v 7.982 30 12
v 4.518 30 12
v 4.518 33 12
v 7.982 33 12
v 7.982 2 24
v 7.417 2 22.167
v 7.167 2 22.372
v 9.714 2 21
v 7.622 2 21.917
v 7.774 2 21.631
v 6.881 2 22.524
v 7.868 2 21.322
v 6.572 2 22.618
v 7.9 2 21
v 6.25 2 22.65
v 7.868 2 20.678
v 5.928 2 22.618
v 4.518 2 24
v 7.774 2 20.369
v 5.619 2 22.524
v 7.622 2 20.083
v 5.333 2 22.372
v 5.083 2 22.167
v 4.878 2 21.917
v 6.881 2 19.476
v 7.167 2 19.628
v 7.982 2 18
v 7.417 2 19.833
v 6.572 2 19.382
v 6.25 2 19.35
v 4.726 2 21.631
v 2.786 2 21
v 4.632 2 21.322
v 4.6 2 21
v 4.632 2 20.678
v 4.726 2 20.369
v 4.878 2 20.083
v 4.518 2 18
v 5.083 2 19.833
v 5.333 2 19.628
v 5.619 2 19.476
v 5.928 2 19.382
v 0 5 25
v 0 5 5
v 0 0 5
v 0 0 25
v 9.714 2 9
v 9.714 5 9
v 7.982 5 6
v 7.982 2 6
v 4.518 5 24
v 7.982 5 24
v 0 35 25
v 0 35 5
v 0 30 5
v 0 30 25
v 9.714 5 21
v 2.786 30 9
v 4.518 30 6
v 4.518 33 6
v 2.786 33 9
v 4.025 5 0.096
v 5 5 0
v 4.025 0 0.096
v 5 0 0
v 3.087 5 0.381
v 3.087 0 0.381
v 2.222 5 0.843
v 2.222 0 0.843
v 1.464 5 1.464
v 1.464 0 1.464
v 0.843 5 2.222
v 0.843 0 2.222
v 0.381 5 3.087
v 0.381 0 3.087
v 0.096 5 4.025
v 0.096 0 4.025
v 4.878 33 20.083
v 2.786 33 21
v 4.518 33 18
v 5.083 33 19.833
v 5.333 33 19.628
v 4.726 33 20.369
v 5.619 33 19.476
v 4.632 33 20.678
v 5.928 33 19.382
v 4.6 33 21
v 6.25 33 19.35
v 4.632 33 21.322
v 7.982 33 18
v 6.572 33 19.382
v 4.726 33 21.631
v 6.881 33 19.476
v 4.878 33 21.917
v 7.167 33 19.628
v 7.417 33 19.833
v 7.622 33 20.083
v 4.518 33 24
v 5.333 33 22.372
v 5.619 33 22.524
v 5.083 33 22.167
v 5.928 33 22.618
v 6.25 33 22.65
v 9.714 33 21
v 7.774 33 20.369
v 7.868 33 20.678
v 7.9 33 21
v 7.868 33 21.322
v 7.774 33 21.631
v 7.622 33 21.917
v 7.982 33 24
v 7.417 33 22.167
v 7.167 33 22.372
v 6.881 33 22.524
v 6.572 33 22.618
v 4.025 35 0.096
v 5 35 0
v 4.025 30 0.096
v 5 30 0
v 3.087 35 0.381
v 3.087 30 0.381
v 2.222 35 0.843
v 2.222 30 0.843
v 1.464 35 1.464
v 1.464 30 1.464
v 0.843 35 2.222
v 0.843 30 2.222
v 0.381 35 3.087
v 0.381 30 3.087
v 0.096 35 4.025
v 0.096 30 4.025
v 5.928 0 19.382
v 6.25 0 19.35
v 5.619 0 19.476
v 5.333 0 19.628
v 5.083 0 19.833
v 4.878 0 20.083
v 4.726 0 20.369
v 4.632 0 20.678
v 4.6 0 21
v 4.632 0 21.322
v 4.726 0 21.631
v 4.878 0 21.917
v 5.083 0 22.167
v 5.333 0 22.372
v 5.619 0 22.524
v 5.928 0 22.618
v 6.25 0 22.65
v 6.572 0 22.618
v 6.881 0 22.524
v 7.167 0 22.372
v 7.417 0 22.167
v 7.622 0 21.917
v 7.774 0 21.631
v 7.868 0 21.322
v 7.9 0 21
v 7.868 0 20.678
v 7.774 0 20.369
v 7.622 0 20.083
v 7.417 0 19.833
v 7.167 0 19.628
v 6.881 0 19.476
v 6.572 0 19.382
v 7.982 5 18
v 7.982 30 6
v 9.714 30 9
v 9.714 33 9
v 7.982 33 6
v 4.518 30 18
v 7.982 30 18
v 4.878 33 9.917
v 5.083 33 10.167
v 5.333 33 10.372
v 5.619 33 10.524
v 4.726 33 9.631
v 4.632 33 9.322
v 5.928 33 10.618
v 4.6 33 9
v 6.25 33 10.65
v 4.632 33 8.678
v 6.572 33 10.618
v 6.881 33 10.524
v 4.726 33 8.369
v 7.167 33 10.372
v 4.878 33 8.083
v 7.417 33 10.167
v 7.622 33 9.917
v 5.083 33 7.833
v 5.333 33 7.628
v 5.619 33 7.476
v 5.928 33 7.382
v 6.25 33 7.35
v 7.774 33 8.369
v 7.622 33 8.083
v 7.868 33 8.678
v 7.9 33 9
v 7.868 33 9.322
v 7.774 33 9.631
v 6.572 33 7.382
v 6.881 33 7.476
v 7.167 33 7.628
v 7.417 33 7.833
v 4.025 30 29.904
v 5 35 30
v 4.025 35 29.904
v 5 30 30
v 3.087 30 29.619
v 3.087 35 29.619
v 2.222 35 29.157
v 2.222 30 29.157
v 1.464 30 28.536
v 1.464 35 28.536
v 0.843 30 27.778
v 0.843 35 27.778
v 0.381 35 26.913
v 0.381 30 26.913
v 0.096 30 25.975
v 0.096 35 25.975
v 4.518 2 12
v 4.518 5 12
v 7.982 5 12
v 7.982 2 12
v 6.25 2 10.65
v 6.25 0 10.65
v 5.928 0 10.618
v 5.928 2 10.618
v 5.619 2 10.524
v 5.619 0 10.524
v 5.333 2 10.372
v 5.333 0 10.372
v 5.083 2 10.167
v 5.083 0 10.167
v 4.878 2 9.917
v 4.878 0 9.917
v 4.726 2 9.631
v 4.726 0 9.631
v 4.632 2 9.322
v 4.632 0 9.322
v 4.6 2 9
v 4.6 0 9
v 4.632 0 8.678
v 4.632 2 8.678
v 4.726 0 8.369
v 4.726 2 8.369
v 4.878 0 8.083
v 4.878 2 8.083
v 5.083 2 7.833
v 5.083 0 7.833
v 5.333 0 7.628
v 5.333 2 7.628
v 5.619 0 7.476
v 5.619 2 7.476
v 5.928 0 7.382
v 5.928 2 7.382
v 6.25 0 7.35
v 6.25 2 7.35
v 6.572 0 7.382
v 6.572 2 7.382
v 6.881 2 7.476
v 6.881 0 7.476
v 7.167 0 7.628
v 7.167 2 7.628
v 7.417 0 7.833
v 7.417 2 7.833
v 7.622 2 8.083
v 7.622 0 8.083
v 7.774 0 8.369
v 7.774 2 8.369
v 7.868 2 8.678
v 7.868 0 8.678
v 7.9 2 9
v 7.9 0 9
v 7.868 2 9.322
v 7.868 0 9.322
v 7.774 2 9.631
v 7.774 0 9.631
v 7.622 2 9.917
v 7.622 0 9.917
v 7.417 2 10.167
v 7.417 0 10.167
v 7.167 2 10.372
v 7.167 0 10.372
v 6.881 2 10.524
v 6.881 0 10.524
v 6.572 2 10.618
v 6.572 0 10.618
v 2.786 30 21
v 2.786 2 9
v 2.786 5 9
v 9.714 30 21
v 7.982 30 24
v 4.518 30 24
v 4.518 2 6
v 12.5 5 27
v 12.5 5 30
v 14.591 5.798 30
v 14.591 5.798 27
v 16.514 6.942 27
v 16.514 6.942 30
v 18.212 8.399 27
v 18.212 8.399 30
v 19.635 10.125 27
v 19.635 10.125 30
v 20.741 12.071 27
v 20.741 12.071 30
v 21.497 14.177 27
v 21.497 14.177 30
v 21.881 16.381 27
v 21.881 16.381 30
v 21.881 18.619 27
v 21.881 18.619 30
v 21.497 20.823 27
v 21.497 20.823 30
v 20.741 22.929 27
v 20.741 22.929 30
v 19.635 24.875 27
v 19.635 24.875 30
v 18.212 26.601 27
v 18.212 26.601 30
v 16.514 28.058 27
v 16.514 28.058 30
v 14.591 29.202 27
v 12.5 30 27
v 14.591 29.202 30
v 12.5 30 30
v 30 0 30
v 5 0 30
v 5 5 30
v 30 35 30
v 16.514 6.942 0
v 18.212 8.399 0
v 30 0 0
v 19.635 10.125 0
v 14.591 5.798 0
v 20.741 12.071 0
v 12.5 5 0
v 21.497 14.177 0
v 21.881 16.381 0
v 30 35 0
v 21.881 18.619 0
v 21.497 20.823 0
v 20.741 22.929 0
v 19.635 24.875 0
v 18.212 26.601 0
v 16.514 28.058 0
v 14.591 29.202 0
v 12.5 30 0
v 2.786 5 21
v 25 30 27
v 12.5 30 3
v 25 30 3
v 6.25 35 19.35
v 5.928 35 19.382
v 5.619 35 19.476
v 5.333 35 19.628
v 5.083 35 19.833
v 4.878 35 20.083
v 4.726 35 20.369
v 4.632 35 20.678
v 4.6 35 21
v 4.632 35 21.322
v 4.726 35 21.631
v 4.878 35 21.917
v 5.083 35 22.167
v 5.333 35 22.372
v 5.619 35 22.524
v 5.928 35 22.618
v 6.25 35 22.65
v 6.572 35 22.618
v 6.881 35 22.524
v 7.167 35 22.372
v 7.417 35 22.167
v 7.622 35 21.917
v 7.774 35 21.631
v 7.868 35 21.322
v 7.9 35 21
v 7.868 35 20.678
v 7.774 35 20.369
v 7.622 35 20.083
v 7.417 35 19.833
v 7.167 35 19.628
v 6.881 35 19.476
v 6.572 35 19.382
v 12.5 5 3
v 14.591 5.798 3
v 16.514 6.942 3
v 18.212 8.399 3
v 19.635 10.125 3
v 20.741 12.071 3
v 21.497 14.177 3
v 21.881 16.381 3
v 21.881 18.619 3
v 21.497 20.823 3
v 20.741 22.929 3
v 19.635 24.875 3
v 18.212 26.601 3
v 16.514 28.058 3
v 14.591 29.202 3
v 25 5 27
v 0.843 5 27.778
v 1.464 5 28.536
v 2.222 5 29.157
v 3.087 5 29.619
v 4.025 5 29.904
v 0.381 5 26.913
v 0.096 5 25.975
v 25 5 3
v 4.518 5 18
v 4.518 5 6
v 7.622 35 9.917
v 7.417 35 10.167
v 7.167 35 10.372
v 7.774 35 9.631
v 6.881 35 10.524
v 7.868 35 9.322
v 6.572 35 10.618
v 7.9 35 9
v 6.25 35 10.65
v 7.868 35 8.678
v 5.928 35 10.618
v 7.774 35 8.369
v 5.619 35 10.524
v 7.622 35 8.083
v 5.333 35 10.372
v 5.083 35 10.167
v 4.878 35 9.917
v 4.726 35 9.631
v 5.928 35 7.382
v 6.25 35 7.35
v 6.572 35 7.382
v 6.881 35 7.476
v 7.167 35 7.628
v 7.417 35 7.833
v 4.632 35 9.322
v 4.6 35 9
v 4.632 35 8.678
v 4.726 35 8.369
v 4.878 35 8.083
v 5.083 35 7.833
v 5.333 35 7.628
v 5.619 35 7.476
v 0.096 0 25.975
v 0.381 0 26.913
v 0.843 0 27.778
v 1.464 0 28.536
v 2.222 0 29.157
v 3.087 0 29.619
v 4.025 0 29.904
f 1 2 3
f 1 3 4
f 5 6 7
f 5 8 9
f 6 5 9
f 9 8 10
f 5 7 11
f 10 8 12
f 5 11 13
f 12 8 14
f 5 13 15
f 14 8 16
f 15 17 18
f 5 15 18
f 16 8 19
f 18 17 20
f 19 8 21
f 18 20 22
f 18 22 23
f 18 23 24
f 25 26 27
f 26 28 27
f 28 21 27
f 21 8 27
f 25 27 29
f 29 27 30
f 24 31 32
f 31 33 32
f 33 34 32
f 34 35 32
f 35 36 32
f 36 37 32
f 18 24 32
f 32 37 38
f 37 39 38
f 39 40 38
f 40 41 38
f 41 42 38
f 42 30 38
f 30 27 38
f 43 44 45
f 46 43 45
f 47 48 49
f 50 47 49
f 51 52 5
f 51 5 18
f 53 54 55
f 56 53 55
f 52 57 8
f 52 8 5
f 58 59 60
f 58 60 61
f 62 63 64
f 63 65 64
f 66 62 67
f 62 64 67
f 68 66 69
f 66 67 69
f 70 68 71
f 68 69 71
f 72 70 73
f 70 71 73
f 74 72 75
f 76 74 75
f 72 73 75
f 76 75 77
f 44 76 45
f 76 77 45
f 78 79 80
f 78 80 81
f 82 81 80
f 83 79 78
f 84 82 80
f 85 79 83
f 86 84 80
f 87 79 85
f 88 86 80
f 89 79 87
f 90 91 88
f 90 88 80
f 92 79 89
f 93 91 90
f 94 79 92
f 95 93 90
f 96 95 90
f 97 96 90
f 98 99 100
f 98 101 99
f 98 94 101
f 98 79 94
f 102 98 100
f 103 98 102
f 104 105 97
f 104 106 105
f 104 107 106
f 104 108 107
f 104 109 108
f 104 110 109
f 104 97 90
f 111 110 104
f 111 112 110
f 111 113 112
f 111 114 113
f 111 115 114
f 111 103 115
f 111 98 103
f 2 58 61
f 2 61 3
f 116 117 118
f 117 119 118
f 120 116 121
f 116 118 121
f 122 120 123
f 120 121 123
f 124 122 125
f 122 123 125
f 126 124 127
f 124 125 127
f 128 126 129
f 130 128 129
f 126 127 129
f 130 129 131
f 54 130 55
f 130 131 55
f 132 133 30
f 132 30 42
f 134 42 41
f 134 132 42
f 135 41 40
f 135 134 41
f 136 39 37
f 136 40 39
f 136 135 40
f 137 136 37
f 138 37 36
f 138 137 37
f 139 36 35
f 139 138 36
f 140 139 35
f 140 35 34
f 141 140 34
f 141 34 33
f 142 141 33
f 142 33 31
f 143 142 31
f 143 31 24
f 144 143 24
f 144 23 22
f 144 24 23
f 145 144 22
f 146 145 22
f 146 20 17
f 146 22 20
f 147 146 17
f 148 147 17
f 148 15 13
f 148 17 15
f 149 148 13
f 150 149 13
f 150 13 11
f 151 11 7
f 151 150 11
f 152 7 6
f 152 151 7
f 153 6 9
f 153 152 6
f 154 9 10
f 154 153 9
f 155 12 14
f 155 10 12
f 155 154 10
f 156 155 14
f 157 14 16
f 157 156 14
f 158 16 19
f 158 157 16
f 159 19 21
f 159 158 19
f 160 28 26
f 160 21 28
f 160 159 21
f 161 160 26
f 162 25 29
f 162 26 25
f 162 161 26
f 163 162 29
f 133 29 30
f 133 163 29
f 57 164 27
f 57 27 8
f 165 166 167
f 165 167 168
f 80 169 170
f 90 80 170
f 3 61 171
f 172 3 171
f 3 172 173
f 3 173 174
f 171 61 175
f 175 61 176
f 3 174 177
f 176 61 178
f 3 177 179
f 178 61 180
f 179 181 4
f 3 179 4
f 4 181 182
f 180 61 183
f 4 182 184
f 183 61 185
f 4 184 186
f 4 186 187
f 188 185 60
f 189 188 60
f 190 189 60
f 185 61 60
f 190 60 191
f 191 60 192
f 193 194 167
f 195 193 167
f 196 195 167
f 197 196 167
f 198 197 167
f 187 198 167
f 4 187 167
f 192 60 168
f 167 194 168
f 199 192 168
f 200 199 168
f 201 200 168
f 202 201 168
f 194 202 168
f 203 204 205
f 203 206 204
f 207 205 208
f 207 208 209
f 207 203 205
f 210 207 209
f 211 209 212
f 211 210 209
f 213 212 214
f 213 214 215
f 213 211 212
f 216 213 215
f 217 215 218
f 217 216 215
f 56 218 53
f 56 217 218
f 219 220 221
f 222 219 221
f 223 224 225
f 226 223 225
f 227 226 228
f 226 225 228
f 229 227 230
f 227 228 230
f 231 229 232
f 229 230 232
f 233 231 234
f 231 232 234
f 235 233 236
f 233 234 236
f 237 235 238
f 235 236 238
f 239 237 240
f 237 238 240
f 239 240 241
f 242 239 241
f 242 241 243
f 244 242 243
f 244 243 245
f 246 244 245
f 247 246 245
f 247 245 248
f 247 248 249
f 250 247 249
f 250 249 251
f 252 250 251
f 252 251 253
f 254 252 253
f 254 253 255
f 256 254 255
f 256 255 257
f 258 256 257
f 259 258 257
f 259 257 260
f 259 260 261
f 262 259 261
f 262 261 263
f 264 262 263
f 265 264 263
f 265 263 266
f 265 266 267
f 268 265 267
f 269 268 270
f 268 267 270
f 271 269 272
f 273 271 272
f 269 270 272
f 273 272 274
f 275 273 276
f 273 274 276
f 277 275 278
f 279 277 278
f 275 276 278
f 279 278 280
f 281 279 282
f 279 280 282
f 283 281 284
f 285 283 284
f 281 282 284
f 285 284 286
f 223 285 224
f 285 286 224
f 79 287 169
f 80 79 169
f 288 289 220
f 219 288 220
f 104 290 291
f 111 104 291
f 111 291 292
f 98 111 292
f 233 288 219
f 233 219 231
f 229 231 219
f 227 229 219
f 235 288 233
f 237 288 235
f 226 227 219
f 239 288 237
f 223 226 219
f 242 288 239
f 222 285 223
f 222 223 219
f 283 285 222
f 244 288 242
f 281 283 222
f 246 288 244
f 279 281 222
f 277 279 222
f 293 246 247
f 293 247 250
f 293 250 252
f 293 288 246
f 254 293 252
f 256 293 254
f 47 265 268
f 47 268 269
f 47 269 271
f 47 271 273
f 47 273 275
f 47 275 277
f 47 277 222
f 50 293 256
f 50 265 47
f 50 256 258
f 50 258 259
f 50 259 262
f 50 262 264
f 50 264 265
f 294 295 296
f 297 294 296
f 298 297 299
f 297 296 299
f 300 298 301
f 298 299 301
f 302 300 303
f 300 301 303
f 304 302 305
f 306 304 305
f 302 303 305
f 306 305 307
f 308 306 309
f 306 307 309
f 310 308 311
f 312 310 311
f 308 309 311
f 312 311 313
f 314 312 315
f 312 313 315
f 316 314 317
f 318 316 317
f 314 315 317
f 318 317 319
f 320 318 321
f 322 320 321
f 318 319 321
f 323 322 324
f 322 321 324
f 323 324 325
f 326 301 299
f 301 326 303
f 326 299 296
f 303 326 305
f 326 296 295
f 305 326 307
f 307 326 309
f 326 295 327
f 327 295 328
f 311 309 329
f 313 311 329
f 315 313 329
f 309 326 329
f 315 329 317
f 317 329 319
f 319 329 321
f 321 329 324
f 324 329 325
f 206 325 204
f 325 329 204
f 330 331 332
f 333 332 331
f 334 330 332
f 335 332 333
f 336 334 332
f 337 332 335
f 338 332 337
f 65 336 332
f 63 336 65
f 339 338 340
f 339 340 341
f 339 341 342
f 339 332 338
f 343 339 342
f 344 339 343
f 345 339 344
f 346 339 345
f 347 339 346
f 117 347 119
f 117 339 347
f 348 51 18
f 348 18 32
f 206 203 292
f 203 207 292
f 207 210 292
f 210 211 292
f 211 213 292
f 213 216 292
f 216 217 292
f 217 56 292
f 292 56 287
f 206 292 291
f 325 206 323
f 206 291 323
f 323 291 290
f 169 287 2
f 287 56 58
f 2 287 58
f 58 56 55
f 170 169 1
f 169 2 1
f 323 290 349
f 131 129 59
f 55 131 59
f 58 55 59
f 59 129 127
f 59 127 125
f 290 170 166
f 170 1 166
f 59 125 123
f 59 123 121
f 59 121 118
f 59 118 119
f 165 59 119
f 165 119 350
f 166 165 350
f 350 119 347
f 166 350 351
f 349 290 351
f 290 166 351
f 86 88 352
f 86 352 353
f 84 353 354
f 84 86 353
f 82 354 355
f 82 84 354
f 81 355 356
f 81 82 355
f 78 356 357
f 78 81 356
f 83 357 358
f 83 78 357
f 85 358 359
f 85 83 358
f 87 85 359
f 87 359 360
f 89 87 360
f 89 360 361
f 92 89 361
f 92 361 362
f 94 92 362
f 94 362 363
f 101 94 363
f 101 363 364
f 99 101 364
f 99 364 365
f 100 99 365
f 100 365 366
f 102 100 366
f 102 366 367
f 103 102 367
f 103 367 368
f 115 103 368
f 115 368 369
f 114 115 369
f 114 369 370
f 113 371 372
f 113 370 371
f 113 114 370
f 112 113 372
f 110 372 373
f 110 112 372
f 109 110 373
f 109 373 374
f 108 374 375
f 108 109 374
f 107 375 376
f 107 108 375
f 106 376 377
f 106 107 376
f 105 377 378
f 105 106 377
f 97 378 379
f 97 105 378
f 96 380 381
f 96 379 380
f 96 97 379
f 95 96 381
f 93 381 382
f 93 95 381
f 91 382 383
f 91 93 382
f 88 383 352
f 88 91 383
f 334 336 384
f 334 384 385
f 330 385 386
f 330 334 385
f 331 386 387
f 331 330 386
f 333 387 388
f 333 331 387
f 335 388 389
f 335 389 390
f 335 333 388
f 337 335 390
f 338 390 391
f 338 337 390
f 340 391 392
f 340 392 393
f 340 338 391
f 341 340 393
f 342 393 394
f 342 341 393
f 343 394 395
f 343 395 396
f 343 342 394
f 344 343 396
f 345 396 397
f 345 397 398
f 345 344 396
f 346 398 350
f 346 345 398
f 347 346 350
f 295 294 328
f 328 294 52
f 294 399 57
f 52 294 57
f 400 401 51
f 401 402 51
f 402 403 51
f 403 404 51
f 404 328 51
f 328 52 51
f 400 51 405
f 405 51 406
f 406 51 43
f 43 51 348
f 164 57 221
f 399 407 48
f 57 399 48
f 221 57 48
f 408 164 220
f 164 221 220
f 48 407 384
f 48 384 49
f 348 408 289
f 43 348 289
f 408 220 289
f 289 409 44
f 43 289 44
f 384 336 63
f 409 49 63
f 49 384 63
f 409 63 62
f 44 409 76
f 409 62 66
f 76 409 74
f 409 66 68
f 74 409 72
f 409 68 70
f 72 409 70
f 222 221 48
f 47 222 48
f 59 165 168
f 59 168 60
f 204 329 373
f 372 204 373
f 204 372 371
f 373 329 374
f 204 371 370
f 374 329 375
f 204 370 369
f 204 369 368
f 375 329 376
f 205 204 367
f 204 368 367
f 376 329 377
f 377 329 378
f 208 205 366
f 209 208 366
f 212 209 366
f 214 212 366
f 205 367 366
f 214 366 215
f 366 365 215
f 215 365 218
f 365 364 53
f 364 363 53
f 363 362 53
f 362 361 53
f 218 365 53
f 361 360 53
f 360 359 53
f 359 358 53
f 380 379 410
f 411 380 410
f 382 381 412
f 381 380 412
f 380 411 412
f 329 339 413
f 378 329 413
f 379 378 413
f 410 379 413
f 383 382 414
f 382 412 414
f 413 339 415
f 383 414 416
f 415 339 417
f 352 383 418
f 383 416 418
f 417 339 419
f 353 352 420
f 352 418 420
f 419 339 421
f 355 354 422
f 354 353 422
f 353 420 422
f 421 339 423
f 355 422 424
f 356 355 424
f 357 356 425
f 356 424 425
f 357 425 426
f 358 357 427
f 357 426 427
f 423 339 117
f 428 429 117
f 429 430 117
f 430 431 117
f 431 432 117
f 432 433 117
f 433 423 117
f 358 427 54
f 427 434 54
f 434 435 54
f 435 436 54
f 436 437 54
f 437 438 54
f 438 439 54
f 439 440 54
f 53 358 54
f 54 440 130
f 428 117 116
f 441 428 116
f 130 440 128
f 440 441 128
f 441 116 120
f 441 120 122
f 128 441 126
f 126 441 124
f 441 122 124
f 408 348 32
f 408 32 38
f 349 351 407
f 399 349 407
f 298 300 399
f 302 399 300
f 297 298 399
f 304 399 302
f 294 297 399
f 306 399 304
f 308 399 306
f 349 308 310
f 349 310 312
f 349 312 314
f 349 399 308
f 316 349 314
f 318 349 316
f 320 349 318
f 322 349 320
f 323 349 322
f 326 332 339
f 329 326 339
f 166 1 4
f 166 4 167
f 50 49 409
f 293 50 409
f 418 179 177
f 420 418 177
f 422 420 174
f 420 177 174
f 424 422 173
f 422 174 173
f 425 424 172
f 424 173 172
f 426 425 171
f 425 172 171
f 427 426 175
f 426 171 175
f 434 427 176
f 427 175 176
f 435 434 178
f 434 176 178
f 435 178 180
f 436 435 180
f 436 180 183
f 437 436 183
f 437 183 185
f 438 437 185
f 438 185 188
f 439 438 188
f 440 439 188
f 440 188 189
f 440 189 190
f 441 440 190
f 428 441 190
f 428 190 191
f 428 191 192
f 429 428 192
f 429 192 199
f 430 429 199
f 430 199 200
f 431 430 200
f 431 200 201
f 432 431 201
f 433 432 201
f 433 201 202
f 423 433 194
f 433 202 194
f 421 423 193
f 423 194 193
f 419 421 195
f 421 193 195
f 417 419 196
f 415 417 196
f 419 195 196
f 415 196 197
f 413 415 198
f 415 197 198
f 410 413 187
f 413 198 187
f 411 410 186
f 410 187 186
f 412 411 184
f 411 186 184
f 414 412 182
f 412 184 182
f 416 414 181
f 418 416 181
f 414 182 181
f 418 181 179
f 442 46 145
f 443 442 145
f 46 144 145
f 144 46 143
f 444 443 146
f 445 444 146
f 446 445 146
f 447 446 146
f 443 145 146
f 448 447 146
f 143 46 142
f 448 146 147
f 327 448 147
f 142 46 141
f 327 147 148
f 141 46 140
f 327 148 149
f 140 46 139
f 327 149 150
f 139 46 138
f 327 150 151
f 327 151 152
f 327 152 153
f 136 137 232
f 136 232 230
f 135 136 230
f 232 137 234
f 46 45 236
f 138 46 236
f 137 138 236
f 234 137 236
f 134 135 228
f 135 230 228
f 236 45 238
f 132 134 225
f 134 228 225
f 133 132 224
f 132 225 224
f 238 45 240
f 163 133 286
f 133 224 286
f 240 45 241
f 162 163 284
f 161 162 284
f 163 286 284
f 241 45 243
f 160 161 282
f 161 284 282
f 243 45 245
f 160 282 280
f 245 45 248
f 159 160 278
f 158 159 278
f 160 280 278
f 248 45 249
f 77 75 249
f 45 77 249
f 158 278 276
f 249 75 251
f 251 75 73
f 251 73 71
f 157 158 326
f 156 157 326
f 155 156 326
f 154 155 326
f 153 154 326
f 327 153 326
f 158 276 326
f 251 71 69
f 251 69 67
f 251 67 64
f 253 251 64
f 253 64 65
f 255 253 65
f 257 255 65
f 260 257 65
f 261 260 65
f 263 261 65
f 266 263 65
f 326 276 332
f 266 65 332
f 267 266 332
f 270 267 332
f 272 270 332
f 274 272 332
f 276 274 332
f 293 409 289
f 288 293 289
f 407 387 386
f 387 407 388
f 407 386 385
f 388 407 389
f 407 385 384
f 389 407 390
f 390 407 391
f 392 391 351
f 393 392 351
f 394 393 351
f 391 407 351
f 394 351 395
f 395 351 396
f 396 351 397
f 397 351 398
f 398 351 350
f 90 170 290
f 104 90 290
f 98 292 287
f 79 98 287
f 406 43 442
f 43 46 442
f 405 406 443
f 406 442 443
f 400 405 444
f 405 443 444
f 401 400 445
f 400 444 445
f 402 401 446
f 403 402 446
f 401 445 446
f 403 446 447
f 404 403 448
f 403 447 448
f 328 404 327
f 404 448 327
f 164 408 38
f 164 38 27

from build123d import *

# Parameters (mm, degrees)
EXTRUDE_1_DEPTH     = 30
EXTRUDE_2_DEPTH     = 3
CUT_EXTRUDE_1_DEPTH = 3
CUT_EXTRUDE_START   = -17
SKETCH_4_R          = 1.65
CUT_EXTRUDE_2_DEPTH = 76
CUT_EXTRUDE_3_DEPTH = 3
FILLET_1_R          = 5


with BuildPart() as part:
    # Эскиз1 → Бобышка-Вытянуть1 (new body)
    with BuildSketch(Plane.XY):
        Polygon((0, 0), (30, 0), (30, 35), (0, 35), (0, 30), (25, 30), (25, 5), (0, 5), align=None)
    extrude(amount=EXTRUDE_1_DEPTH)

    # Эскиз2 → Бобышка-Вытянуть2 (add)
    with BuildSketch(Plane.XY.offset(30)):
        with BuildLine():
            Line((12.5, 30), (25, 30))
            Line((25, 30), (25, 5))
            Line((25, 5), (12.5, 5))
            ThreePointArc((12.5, 5), (21.929285786, 17.5), (12.5, 30))
        make_face()
    extrude_2 = extrude(amount=-EXTRUDE_2_DEPTH)

    # Зеркальное отражение1: Бобышка-Вытянуть2 across plane
    add(extrude_2.mirror(Plane.XY.offset(15)))

    # Эскиз3 → Вырез-Вытянуть1 (cut)
    with BuildSketch(Plane(origin=(0, 5, 0), x_dir=(1, 0, 0), z_dir=(0, 1, 0))):
        Polygon((4.517949192, -24), (2.785898385, -21), (4.517949192, -18), (7.982050808, -18), (9.714101615, -21), (7.982050808, -24), align=None)
        Polygon((2.785898385, -9), (4.517949192, -12), (7.982050808, -12), (9.714101615, -9), (7.982050808, -6), (4.517949192, -6), align=None)
    extrude(amount=-CUT_EXTRUDE_1_DEPTH, mode=Mode.SUBTRACT)

    # Эскиз4 → Вырез-Вытянуть2 (cut)
    with BuildSketch(Plane(origin=(0, 2, 0), x_dir=(1, 0, 0), z_dir=(0, 1, 0)).offset(CUT_EXTRUDE_START)):
        with Locations(Location((6.25, -21, 0), (0, 0, 90))):
            Circle(SKETCH_4_R)
    cut_extrude_2 = extrude(amount=CUT_EXTRUDE_2_DEPTH, mode=Mode.SUBTRACT)

    # Зеркальное отражение2: Вырез-Вытянуть2 across plane
    add(cut_extrude_2.mirror(Plane.XY.offset(15)), mode=Mode.SUBTRACT)

    # Эскиз5 → Вырез-Вытянуть3 (cut)
    with BuildSketch(Plane.XZ.offset(-30)):
        Polygon((9.714101615, 21), (7.982050808, 24), (4.517949192, 24), (2.785898385, 21), (4.517949192, 18), (7.982050808, 18), align=None)
    cut_extrude_3 = extrude(amount=-CUT_EXTRUDE_3_DEPTH, mode=Mode.SUBTRACT)

    # Зеркальное отражение3: Вырез-Вытянуть3 across plane
    add(cut_extrude_3.mirror(Plane.XY.offset(15)), mode=Mode.SUBTRACT)

    # Скругление1
    fillet_1_edges = [part.edges().sort_by_distance(p)[0] for p in [
        (0, 2.5, 0),
        (0, 32.5, 30),
        (0, 2.5, 30),
        (0, 32.5, 0),
    ]]
    fillet(fillet_1_edges, radius=FILLET_1_R)


solid = part.part
